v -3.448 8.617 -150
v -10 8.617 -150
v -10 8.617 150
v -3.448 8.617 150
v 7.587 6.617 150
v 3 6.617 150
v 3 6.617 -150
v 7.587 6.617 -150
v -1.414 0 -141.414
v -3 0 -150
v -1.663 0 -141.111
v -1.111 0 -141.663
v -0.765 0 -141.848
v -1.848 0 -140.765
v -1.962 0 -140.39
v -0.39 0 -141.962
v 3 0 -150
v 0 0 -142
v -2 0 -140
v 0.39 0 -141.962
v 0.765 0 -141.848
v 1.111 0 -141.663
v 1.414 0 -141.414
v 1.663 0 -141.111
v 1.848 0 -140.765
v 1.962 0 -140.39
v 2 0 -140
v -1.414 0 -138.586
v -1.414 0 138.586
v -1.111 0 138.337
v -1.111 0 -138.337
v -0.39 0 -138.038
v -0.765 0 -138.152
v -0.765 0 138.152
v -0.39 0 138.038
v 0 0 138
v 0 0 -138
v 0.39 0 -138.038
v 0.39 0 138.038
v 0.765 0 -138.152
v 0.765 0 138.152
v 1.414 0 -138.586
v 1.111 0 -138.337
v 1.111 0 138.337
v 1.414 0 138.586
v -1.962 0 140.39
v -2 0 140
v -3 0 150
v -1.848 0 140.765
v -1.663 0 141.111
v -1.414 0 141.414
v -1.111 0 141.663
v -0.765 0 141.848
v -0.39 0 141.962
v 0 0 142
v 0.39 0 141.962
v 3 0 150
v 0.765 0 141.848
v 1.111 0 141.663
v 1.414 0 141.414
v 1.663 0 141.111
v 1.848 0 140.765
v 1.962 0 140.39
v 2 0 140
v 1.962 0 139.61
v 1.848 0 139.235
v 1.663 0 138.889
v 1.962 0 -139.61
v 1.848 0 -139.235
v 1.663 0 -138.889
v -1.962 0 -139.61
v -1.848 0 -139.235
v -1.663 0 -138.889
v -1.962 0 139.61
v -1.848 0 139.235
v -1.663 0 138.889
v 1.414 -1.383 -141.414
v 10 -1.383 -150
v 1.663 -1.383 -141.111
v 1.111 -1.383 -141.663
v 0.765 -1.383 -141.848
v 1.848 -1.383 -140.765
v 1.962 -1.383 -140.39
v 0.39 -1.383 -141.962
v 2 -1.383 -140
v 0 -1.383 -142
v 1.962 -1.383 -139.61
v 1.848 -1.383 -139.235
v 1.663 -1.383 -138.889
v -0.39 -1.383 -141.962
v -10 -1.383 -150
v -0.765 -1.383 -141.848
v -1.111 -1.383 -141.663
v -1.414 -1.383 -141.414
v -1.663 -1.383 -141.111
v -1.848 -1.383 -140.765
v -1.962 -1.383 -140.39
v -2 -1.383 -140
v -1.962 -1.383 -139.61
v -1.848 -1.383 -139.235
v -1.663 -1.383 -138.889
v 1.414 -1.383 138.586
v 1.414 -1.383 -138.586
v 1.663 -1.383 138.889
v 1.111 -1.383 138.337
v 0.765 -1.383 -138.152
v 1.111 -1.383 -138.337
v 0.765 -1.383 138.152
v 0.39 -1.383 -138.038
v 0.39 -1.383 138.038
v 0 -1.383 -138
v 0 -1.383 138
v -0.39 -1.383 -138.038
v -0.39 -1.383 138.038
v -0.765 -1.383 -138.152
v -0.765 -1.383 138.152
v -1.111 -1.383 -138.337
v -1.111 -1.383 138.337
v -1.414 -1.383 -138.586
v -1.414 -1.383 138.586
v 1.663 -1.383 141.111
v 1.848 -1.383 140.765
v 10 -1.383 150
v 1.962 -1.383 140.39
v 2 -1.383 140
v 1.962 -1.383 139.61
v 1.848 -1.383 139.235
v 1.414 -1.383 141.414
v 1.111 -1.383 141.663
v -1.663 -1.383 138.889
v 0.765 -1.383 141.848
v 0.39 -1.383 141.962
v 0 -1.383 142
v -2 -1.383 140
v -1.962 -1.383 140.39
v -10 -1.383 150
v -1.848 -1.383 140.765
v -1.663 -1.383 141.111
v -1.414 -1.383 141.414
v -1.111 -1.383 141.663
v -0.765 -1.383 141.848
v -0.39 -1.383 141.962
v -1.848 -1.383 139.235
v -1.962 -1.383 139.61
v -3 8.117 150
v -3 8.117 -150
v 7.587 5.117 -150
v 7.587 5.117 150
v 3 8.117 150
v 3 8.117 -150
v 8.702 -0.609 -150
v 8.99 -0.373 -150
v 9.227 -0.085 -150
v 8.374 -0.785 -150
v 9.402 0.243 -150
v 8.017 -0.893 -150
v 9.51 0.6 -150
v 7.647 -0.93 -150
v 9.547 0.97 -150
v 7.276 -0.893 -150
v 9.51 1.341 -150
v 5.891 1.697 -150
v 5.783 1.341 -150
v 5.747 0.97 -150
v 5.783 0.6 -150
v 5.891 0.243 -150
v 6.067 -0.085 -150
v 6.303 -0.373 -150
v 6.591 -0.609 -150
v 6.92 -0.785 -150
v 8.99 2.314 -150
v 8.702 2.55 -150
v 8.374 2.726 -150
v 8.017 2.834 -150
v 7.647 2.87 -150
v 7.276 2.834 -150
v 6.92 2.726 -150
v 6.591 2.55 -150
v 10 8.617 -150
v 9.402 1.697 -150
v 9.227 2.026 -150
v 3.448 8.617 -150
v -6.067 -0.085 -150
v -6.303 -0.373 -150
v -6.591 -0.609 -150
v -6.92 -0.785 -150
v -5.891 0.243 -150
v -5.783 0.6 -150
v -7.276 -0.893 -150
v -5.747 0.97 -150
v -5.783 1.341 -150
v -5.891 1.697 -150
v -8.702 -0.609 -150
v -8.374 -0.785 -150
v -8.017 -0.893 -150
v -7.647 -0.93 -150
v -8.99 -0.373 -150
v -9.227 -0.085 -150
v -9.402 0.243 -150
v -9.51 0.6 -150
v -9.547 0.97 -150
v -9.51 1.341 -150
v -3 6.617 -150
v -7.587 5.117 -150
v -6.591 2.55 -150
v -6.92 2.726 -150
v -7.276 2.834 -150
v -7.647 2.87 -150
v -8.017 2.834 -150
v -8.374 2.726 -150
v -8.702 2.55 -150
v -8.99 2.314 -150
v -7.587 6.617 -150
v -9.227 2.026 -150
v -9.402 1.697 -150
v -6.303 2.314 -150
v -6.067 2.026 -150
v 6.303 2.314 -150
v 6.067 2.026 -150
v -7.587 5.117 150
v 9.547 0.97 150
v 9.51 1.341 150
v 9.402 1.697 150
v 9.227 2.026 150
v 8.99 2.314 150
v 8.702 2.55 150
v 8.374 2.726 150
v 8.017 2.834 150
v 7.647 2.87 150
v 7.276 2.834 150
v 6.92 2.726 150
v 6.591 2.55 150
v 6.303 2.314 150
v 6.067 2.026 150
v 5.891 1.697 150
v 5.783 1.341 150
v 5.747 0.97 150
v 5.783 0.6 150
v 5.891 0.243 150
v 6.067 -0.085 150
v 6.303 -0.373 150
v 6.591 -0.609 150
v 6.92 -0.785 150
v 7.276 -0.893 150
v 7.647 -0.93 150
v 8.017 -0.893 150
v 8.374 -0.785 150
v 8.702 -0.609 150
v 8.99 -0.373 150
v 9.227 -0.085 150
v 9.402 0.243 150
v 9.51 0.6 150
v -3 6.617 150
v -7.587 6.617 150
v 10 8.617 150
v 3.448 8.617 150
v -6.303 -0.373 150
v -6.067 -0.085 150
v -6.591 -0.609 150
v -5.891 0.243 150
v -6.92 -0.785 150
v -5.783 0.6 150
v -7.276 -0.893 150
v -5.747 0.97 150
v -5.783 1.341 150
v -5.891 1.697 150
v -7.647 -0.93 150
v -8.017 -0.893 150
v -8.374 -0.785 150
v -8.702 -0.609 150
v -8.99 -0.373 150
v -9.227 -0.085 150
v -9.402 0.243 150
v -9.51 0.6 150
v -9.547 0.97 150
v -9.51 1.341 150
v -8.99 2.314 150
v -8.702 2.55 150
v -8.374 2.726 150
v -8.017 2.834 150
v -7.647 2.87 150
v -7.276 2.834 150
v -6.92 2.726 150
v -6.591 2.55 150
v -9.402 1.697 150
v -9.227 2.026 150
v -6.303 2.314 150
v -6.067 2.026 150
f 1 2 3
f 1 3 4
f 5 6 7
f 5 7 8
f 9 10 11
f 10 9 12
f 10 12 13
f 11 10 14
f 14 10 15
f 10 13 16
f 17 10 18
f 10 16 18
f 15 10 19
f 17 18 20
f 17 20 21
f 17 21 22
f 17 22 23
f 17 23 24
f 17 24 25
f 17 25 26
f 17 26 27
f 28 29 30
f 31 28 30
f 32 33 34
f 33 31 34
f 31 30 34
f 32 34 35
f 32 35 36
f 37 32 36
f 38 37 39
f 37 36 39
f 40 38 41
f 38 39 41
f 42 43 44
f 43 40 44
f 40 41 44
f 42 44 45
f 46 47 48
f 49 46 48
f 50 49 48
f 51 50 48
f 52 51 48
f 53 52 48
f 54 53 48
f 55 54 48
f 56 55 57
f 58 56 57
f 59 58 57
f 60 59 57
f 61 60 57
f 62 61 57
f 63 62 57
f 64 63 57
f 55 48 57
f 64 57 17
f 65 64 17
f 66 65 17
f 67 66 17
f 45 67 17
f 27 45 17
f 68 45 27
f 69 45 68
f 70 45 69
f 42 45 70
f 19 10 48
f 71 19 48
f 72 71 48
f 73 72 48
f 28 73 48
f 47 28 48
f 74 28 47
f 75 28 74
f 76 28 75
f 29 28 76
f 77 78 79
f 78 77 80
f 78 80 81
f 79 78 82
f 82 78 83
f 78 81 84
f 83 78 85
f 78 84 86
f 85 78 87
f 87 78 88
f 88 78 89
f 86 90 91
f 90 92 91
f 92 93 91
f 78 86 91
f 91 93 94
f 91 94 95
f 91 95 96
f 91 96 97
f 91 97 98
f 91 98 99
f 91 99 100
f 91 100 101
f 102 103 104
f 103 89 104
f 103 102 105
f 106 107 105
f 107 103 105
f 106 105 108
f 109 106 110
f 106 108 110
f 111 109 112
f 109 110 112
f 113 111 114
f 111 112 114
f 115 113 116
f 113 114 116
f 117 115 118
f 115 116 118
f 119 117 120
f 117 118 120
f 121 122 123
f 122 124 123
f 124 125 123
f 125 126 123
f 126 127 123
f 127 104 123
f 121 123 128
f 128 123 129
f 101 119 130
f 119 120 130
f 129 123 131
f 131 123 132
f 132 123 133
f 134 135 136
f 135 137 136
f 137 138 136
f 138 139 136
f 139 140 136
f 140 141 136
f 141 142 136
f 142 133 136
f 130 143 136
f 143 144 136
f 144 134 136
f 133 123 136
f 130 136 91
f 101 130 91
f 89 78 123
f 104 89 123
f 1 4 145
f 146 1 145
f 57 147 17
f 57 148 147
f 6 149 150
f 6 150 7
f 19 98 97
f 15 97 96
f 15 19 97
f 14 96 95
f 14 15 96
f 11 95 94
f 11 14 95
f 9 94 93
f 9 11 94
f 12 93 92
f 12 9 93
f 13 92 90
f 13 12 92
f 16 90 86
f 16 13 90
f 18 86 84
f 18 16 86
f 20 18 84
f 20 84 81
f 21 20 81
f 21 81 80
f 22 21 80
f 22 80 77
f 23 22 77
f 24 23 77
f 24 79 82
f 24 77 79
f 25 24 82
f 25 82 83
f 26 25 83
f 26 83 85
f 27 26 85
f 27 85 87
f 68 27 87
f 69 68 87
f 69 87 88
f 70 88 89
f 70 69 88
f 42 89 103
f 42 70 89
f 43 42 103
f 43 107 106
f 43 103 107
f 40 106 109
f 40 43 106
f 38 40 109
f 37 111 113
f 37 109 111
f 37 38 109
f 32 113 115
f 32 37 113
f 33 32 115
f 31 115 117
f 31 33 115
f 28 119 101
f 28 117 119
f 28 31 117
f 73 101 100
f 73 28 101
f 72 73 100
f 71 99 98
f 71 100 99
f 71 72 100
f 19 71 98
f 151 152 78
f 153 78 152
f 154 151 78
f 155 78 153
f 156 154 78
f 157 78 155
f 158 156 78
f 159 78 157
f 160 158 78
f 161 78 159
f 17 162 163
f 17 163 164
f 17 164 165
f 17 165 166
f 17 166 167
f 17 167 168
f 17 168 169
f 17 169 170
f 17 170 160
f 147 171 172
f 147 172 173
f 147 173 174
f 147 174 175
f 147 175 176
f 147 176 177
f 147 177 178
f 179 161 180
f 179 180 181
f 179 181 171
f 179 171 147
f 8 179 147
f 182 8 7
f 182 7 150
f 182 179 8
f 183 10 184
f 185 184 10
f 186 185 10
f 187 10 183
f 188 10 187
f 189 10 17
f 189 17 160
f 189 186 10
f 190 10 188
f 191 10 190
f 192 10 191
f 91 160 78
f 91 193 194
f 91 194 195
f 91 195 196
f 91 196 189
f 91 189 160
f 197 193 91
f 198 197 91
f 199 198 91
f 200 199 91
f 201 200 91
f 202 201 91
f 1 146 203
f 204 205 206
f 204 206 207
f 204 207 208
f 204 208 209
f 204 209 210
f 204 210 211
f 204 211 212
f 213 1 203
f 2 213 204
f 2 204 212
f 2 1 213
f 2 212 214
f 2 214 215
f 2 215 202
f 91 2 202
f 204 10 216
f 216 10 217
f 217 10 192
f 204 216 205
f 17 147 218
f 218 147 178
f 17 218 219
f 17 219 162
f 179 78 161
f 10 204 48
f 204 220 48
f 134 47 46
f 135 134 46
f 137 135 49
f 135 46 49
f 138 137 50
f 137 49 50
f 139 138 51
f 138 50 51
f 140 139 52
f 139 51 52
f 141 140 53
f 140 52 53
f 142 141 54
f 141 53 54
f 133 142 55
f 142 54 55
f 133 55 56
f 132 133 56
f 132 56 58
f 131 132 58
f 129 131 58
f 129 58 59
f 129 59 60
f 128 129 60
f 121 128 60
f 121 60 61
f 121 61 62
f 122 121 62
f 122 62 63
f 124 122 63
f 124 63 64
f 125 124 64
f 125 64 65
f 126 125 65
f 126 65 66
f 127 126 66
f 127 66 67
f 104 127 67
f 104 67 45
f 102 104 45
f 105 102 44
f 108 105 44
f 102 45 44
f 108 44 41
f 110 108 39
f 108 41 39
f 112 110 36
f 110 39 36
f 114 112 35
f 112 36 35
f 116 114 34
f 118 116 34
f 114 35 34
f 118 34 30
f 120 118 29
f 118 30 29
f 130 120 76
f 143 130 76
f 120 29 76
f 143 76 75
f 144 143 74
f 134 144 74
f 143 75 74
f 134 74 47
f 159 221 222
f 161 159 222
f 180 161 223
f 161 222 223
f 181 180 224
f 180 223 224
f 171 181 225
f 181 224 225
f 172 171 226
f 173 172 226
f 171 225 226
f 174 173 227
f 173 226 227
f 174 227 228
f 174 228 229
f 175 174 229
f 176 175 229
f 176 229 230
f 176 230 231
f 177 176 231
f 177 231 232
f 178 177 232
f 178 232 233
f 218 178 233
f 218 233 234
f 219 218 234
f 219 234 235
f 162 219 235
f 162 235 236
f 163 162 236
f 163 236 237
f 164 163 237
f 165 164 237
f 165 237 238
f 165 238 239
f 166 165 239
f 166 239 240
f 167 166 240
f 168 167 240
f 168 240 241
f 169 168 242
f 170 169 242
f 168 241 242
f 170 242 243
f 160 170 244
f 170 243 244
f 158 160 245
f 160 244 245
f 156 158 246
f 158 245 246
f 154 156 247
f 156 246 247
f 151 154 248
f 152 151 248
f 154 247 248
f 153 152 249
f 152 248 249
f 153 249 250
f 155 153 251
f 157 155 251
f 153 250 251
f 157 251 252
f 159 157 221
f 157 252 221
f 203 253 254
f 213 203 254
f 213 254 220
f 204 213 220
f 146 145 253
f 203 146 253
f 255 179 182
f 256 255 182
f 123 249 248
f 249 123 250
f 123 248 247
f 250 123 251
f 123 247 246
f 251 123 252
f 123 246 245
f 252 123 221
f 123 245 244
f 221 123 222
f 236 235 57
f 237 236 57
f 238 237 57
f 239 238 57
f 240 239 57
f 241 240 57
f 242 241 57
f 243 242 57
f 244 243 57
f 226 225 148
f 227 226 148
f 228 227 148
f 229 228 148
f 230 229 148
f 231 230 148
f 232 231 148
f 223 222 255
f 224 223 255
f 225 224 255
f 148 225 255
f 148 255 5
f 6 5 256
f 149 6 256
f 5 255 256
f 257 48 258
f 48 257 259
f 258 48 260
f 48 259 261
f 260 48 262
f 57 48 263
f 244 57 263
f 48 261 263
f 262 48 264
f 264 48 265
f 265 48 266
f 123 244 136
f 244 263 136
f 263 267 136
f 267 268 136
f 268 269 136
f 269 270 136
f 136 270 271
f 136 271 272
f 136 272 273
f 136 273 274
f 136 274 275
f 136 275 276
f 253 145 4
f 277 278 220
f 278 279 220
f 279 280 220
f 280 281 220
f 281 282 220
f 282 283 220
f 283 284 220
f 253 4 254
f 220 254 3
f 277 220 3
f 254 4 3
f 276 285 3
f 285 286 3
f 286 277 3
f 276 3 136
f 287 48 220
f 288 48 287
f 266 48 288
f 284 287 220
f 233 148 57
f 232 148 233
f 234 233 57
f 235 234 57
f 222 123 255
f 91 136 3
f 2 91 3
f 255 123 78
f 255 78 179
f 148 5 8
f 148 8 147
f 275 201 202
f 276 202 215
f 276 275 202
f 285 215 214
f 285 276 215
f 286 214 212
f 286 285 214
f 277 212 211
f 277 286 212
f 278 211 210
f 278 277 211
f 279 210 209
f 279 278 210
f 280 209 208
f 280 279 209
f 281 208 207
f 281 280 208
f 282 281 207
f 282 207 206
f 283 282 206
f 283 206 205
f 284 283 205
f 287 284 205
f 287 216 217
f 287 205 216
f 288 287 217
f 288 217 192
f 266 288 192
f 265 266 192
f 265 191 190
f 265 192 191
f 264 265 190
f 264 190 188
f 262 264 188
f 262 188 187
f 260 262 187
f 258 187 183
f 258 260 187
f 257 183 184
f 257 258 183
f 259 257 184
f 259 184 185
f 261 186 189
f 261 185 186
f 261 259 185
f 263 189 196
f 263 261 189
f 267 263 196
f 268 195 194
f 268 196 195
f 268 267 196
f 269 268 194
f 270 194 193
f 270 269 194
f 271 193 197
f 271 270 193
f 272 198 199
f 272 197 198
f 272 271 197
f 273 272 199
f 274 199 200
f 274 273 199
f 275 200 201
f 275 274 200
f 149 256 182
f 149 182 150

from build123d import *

# Parameters (mm, degrees)
BOSS_EXTRUDE1_DEPTH = 150
SKETCH2_R           = 1.9
CUT_EXTRUDE1_DEPTH  = 301.290281321
SKETCH3_R           = 2
CUT_EXTRUDE2_DEPTH  = 10


with BuildPart() as part:
    # Sketch1 → Boss-Extrude1 (new, symmetric)
    with BuildSketch(Plane.XY):
        Polygon((0, 0), (0, -1.382978723), (10, -1.382978723), (10, 8.617021277), (3.448211747, 8.617021277), (3, 8.117021277), (3, 6.617021277), (7.587018089, 6.617021277), (7.587018089, 5.117021277), (3, 0), align=None)
    boss_extrude1 = extrude(amount=BOSS_EXTRUDE1_DEPTH, both=True)

    # Mirror1: Boss-Extrude1 across plane
    add(boss_extrude1.mirror(Plane(origin=(0, 0, 0), x_dir=(0, 0, 1), z_dir=(1, 0, 0))))

    # Sketch2 → Cut-Extrude1 (cut, through all)
    with BuildSketch(Plane.XY.offset(150)):
        with Locations((7.646716257, 0.97030502)):
            Circle(SKETCH2_R)
    cut_extrude1 = extrude(amount=-CUT_EXTRUDE1_DEPTH, mode=Mode.SUBTRACT)

    # Mirror2: Cut-Extrude1 across plane
    add(cut_extrude1.mirror(Plane(origin=(0, 0, 0), x_dir=(0, 0, 1), z_dir=(1, 0, 0))), mode=Mode.SUBTRACT)

    # Sketch3 → Cut-Extrude2 (cut)
    with BuildSketch(Plane(origin=(0, 0, 0), x_dir=(1, 0, 0), z_dir=(0, 1, 0))):
        with Locations(Location((0, -140, 0), (0, 0, 180))):
            Circle(SKETCH3_R)
    cut_extrude2 = extrude(amount=-CUT_EXTRUDE2_DEPTH, mode=Mode.SUBTRACT)

    # Mirror3: Cut-Extrude2 across plane
    add(cut_extrude2.mirror(Plane.XY), mode=Mode.SUBTRACT)


solid = part.part
